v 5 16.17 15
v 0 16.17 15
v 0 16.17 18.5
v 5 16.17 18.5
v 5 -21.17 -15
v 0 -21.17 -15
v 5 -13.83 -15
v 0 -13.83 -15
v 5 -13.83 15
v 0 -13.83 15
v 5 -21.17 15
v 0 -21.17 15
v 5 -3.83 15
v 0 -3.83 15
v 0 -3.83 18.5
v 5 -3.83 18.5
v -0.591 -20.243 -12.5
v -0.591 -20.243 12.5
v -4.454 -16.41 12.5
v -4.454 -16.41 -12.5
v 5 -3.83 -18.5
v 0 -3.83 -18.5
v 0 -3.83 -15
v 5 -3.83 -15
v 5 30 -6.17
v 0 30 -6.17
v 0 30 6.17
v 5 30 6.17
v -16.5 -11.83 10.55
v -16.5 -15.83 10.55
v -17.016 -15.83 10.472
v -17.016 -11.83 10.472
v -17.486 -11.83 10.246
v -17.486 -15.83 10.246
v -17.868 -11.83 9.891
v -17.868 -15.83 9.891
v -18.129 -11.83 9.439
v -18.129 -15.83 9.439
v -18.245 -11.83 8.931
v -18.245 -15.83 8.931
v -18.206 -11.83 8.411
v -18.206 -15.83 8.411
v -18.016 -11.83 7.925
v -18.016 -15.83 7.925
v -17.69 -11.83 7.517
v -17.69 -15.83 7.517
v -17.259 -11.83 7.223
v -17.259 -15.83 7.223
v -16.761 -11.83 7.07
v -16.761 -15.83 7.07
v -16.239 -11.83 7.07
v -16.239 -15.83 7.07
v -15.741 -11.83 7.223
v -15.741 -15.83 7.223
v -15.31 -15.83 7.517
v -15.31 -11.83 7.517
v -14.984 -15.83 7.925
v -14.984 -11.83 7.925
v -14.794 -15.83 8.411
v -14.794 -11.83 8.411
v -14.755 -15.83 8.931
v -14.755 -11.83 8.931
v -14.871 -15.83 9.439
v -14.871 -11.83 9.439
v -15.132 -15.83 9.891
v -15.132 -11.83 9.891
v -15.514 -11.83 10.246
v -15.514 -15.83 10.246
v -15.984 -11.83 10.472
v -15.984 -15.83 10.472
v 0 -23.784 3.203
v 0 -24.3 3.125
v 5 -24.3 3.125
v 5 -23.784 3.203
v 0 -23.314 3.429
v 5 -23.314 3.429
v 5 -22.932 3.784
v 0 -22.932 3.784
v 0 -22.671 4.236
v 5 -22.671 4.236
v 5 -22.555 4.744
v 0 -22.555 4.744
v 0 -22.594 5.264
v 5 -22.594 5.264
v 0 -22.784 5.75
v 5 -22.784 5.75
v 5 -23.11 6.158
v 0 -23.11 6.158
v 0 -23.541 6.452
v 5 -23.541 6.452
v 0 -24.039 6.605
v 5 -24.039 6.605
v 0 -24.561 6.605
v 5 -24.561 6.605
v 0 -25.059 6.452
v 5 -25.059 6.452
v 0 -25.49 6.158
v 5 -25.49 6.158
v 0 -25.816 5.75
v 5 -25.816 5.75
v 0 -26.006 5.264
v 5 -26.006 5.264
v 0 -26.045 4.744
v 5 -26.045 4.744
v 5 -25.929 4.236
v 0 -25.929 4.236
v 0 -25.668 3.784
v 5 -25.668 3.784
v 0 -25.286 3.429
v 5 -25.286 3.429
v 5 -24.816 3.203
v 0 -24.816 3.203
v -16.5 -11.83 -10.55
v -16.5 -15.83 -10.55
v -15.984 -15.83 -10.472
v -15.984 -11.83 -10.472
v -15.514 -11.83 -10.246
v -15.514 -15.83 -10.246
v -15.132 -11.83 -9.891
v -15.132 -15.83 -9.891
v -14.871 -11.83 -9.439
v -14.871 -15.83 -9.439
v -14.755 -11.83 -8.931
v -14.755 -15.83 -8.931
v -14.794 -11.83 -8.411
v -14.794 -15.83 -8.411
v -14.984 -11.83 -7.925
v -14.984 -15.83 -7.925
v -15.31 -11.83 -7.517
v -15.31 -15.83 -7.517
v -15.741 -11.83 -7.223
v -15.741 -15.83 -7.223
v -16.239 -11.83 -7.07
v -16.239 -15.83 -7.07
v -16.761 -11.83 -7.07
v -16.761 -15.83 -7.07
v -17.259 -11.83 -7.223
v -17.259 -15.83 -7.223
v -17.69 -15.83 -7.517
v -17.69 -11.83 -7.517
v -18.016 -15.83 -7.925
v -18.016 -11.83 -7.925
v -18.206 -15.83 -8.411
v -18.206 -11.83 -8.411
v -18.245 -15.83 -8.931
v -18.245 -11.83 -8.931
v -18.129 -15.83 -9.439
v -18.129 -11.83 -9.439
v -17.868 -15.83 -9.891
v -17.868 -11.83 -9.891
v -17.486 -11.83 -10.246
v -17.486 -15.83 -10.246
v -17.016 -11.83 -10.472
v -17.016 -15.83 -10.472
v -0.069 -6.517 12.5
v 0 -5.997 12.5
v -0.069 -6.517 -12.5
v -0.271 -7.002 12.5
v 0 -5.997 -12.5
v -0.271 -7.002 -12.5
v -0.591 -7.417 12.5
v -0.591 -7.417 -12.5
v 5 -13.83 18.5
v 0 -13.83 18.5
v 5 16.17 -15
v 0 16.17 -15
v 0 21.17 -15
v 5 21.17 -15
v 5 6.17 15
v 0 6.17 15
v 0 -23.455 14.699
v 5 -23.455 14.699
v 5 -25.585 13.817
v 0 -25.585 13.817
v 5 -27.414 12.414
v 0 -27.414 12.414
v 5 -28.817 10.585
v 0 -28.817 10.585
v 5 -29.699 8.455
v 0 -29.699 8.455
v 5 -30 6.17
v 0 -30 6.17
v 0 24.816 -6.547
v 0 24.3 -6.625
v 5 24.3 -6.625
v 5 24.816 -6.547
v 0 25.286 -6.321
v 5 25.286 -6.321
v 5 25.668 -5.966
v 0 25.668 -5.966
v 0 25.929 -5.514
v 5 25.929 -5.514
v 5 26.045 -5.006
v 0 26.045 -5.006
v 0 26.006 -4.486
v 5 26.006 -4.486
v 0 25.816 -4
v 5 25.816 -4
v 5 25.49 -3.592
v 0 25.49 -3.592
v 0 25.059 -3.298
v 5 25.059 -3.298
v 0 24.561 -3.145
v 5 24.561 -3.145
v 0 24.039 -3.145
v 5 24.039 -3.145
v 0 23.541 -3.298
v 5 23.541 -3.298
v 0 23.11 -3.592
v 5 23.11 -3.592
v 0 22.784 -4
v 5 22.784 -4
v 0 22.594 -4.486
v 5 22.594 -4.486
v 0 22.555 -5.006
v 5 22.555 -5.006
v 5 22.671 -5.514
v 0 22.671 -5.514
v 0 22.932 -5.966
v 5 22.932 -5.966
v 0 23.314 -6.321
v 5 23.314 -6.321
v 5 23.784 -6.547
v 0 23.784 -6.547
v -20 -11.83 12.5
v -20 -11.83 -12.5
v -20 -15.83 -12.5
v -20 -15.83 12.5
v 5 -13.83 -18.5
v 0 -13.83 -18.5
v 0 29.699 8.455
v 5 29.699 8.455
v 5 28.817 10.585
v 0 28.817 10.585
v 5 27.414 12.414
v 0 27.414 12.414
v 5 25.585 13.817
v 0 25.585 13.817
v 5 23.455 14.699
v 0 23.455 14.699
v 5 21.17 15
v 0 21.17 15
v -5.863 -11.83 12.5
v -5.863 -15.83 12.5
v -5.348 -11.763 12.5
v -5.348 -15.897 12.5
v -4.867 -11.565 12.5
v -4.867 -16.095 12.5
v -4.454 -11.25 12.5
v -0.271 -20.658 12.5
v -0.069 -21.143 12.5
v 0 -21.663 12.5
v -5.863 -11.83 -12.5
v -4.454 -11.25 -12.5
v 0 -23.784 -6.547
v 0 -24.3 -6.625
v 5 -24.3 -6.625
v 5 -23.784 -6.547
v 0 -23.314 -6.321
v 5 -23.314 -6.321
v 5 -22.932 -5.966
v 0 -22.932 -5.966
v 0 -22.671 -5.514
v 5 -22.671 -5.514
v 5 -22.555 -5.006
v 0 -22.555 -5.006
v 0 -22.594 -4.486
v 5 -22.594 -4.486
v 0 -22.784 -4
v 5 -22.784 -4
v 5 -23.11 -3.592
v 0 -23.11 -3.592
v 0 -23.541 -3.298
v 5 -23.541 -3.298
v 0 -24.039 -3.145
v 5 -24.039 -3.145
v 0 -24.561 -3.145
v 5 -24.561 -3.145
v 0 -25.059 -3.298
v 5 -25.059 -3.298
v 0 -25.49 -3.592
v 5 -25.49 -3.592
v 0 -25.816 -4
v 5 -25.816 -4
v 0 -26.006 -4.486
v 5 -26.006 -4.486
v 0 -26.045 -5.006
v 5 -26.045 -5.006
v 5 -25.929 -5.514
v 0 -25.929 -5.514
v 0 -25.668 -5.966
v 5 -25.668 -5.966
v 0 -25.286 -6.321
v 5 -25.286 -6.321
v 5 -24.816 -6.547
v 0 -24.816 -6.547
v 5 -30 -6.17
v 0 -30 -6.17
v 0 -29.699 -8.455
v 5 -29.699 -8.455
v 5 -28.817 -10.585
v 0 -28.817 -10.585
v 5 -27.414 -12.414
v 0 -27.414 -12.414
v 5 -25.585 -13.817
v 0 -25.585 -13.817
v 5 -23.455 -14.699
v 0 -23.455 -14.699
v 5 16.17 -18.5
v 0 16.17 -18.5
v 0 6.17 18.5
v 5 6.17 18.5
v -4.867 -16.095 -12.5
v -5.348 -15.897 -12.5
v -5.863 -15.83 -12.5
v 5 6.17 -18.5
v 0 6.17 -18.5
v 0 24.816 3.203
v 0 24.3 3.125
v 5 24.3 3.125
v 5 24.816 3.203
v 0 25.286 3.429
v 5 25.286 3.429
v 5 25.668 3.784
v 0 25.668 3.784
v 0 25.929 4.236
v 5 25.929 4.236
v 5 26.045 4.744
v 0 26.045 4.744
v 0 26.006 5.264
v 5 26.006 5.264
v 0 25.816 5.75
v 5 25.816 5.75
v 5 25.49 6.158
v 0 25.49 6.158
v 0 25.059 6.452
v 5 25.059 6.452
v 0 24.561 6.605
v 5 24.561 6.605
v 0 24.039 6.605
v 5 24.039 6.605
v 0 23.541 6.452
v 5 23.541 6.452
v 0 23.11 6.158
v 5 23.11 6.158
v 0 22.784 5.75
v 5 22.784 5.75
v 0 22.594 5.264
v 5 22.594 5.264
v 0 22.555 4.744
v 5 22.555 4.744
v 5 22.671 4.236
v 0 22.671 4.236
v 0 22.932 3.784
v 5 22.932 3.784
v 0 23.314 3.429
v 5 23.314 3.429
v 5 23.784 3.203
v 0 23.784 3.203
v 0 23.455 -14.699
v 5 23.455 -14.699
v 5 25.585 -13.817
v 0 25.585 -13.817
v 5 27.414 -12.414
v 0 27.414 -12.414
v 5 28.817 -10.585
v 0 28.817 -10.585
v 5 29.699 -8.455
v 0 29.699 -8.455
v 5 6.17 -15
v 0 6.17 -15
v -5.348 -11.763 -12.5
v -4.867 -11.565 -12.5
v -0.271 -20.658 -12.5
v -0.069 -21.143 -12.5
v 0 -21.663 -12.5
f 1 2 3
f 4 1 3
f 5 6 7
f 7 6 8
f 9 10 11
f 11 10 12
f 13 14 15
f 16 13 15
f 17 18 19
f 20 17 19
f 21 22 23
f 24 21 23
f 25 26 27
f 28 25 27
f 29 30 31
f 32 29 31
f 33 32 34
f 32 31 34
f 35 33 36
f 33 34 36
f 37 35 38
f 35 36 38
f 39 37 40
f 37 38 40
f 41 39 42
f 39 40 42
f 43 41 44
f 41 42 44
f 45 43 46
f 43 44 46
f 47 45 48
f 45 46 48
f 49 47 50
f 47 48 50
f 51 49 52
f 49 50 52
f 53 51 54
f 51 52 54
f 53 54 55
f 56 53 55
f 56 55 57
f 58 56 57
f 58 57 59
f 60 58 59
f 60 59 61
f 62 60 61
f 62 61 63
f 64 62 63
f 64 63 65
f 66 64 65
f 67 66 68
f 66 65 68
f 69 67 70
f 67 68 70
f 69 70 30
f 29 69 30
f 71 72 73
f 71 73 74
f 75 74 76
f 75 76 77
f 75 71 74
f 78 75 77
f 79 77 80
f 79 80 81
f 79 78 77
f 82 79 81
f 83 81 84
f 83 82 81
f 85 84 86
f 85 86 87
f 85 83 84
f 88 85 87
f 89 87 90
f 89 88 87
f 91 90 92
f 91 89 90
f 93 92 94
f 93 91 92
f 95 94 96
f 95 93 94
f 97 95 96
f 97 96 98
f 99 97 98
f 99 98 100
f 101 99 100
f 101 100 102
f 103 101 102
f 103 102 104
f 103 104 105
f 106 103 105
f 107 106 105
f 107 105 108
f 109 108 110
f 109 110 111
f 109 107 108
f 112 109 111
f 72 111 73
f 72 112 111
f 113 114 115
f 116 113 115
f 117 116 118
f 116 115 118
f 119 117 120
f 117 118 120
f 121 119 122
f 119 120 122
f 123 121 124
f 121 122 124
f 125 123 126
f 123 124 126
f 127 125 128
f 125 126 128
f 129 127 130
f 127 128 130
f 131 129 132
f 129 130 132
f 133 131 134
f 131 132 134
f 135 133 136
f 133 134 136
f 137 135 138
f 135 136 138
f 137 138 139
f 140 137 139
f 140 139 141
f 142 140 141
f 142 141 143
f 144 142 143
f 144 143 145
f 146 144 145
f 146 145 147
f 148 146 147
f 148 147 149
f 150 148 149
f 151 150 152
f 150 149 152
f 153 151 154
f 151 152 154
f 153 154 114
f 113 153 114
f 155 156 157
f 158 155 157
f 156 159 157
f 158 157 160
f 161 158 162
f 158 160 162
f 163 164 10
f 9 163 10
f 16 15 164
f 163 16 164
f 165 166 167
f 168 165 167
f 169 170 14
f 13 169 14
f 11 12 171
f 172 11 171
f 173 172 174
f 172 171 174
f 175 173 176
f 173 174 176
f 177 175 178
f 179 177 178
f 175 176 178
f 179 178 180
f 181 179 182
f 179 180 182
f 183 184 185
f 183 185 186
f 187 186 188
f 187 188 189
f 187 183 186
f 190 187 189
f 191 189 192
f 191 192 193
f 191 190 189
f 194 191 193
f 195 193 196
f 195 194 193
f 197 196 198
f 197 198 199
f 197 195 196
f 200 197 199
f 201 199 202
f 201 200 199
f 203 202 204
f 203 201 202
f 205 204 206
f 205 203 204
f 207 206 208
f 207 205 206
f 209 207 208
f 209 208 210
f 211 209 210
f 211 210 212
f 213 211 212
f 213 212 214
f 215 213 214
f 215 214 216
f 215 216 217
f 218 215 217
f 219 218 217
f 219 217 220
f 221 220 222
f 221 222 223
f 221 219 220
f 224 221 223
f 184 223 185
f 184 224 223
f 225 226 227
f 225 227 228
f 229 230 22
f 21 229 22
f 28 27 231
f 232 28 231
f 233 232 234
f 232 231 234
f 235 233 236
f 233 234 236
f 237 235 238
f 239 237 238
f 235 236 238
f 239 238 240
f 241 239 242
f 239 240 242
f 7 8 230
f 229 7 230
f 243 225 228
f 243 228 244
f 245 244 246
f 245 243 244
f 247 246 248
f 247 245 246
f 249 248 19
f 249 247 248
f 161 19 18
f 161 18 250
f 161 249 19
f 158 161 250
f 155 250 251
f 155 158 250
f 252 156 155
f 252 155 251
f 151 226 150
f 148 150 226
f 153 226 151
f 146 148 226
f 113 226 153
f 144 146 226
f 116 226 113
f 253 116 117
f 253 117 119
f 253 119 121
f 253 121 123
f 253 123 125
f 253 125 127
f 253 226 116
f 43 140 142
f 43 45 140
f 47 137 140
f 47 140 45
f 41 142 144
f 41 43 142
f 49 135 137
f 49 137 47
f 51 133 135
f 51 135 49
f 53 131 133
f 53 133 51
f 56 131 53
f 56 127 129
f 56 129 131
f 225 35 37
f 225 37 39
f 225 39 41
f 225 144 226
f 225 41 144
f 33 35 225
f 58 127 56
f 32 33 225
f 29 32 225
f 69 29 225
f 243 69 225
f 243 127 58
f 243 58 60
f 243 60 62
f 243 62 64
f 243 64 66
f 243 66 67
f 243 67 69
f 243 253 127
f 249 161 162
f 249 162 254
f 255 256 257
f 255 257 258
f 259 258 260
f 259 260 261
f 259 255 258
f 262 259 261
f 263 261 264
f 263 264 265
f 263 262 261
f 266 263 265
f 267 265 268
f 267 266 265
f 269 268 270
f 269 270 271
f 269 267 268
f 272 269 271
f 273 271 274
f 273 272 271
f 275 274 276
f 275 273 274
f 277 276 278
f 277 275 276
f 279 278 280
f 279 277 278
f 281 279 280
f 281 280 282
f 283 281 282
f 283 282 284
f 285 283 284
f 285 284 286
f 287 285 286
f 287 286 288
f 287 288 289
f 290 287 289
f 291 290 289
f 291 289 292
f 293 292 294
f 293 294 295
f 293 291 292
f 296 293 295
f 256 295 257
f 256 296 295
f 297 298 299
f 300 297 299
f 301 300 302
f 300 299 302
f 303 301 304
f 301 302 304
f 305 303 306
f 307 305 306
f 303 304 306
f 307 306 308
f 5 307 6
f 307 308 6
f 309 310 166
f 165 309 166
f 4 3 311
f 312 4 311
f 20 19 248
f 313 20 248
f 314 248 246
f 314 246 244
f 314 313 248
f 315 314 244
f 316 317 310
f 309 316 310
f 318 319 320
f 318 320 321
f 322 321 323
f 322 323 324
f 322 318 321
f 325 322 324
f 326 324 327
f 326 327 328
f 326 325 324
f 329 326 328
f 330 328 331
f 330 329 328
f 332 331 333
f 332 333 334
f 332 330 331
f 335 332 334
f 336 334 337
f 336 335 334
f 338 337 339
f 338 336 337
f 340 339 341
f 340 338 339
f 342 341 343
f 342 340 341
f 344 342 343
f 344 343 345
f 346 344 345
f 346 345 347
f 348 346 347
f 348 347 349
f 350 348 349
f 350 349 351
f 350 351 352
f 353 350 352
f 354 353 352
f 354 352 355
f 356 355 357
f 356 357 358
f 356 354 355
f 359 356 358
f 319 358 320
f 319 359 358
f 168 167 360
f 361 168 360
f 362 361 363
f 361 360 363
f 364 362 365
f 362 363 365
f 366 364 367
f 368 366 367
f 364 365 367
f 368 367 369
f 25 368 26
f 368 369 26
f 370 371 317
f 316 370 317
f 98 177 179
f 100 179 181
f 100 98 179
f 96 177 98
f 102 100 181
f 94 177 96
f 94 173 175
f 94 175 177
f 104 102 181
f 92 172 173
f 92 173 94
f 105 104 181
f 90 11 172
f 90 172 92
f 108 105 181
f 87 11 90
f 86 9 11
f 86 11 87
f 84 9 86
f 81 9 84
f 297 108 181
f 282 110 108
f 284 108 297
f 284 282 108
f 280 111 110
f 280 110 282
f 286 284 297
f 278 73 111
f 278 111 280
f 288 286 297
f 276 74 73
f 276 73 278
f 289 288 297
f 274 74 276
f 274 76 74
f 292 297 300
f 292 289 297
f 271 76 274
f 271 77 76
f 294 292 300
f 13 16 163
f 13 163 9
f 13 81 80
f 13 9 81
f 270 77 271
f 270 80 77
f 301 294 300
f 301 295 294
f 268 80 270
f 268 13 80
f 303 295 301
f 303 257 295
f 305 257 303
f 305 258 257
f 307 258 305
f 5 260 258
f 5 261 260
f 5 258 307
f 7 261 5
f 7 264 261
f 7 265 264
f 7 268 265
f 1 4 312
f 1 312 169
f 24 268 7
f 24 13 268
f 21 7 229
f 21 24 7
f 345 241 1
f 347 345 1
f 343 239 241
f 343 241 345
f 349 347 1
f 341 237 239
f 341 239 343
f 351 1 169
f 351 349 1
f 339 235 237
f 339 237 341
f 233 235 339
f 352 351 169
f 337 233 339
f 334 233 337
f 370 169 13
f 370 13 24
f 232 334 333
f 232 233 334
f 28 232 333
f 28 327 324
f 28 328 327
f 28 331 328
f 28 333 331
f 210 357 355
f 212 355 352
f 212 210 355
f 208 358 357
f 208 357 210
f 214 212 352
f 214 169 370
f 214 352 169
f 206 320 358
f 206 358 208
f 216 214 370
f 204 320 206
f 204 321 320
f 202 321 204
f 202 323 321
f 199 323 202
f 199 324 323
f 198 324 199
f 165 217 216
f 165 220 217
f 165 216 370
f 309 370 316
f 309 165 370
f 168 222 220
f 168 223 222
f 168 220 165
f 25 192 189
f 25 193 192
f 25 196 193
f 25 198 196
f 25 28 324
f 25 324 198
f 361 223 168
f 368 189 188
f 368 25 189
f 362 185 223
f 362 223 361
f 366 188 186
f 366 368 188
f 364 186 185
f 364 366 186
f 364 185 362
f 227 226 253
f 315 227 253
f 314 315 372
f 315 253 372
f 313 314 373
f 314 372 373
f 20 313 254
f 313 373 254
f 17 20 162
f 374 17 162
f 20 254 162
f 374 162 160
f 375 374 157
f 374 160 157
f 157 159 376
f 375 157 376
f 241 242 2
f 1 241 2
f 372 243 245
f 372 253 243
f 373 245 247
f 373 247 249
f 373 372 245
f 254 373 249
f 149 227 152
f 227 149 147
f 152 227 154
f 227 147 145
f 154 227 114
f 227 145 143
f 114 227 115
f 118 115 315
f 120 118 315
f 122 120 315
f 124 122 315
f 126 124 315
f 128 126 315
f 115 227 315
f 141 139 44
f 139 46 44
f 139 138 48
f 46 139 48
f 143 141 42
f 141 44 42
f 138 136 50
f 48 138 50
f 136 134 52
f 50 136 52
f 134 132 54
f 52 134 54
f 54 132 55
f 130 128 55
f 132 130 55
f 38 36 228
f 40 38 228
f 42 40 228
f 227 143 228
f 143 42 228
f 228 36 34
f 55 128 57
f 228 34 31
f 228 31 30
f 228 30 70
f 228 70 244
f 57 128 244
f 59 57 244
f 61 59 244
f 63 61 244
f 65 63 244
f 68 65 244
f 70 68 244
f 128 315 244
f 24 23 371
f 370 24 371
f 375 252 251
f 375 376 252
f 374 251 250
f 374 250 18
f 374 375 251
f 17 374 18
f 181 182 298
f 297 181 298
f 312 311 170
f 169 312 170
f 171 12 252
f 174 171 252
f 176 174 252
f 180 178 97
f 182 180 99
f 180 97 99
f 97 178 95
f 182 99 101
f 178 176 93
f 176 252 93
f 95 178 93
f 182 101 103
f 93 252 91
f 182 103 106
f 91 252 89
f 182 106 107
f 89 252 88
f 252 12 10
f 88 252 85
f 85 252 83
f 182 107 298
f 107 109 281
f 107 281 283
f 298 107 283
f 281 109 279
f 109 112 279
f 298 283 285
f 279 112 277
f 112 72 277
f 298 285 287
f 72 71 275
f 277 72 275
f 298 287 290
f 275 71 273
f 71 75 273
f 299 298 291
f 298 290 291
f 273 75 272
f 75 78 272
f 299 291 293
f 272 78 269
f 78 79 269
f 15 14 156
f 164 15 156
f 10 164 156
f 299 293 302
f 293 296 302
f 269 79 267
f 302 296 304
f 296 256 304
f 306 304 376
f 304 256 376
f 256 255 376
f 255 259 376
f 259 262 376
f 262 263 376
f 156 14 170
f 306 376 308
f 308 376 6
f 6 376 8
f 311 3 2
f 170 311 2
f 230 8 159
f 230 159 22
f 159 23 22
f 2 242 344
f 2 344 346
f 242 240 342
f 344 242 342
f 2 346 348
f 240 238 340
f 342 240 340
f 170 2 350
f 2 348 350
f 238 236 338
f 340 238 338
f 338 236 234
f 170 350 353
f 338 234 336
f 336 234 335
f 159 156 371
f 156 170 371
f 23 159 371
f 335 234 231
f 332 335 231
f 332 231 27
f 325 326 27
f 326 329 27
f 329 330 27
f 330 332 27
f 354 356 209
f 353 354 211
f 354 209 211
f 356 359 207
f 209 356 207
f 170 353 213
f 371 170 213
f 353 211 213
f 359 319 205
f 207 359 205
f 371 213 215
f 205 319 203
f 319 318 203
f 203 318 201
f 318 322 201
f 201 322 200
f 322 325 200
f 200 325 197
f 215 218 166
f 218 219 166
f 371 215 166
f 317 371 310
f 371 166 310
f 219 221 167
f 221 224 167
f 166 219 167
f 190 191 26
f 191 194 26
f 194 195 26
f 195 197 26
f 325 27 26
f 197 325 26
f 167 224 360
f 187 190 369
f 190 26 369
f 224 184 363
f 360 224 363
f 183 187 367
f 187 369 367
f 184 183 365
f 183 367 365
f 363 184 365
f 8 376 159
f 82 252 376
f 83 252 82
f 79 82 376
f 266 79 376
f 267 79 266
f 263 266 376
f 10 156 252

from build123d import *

# Parameters (mm, degrees)
BOSS_EXTRUDE1_START     = -5
BOSS_EXTRUDE1_OUTLINE_R = 1.75
BOSS_EXTRUDE1_DEPTH     = 5
SKETCH3_W               = 25
SKETCH3_H               = 4
BOSS_EXTRUDE2_DEPTH     = 20
SKETCH4_R               = 1.75
CUT_EXTRUDE1_DEPTH      = 4
BOSS_EXTRUDE3_DEPTH     = 25
FILLET2_R               = 2


with BuildPart() as part:
    # Boss-Extrude1: read off the stored shape, not the designer's step
    # Boss-Extrude1 outline → Boss-Extrude1 (new body)
    with BuildSketch(Plane(origin=(5, 0, 0), x_dir=(0, 0, -1), z_dir=(1, 0, 0)).offset(BOSS_EXTRUDE1_START)):
        with BuildLine():
            Line((-6.17, -30), (6.17, -30))
            ThreePointArc((6.17, -30), (12.413752878, -27.413752878), (15, -21.17))
            Line((15, -21.17), (15, -13.83))
            Line((15, -13.83), (18.5, -13.83))
            Line((18.5, -13.83), (18.5, -3.83))
            Line((18.5, -3.83), (15, -3.83))
            Line((15, -3.83), (15, 6.17))
            Line((15, 6.17), (18.5, 6.17))
            Line((18.5, 6.17), (18.5, 16.17))
            Line((18.5, 16.17), (15, 16.17))
            Line((15, 16.17), (15, 21.17))
            ThreePointArc((15, 21.17), (12.413752878, 27.413752878), (6.17, 30))
            Line((6.17, 30), (-6.17, 30))
            ThreePointArc((-6.17, 30), (-12.413752878, 27.413752878), (-15, 21.17))
            Line((-15, 21.17), (-15, 16.17))
            Line((-15, 16.17), (-18.5, 16.17))
            Line((-18.5, 16.17), (-18.5, 6.17))
            Line((-18.5, 6.17), (-15, 6.17))
            Line((-15, 6.17), (-15, -3.83))
            Line((-15, -3.83), (-18.5, -3.83))
            Line((-18.5, -3.83), (-18.5, -13.83))
            Line((-18.5, -13.83), (-15, -13.83))
            Line((-15, -13.83), (-15, -21.17))
            ThreePointArc((-15, -21.17), (-12.413752878, -27.413752878), (-6.17, -30))
        make_face()
        with Locations((-4.875, -24.3)):
            Circle(BOSS_EXTRUDE1_OUTLINE_R, mode=Mode.SUBTRACT)
        with Locations((4.875, -24.3)):
            Circle(BOSS_EXTRUDE1_OUTLINE_R, mode=Mode.SUBTRACT)
        with Locations((-4.875, 24.3)):
            Circle(BOSS_EXTRUDE1_OUTLINE_R, mode=Mode.SUBTRACT)
        with Locations((4.875, 24.3)):
            Circle(BOSS_EXTRUDE1_OUTLINE_R, mode=Mode.SUBTRACT)
    extrude(amount=BOSS_EXTRUDE1_DEPTH)

    # Sketch3 → Boss-Extrude2 (add)
    with BuildSketch(Plane.ZY):
        with Locations((0, -13.83)):
            Rectangle(SKETCH3_W, SKETCH3_H)
    extrude(amount=BOSS_EXTRUDE2_DEPTH)

    # Sketch4 → Cut-Extrude1 (cut)
    with BuildSketch(Plane.XZ.offset(15.83)):
        with Locations(Location((-16.5, -8.8, 0), (0, 0, 270))):
            Circle(SKETCH4_R)
        with Locations(Location((-16.5, 8.8, 0), (0, 0, 90))):
            Circle(SKETCH4_R)
    extrude(amount=-CUT_EXTRUDE1_DEPTH, mode=Mode.SUBTRACT)

    # Sketch6 → Boss-Extrude3 (add)
    with BuildSketch(Plane.XY.offset(12.5)):
        Polygon((0, -11.83), (1.101299034, -11.83), (1.101299034, -6.83), (0, -6.83), (-5.038932071, -11.83), align=None)
        Polygon((-5.038932071, -15.83), (0, -15.83), (1.101299034, -15.83), (1.101299034, -20.83), (0, -20.83), align=None)
    extrude(amount=-BOSS_EXTRUDE3_DEPTH)

    # Fillet2
    fillet2_edges = [part.edges().sort_by_distance(p)[0] for p in [
        (0, -6.83, 0),
        (-5.038932071, -11.83, 0),
        (-5.038932071, -15.83, 0),
        (0, -20.83, 0),
    ]]
    fillet(fillet2_edges, radius=FILLET2_R)


solid = part.part
